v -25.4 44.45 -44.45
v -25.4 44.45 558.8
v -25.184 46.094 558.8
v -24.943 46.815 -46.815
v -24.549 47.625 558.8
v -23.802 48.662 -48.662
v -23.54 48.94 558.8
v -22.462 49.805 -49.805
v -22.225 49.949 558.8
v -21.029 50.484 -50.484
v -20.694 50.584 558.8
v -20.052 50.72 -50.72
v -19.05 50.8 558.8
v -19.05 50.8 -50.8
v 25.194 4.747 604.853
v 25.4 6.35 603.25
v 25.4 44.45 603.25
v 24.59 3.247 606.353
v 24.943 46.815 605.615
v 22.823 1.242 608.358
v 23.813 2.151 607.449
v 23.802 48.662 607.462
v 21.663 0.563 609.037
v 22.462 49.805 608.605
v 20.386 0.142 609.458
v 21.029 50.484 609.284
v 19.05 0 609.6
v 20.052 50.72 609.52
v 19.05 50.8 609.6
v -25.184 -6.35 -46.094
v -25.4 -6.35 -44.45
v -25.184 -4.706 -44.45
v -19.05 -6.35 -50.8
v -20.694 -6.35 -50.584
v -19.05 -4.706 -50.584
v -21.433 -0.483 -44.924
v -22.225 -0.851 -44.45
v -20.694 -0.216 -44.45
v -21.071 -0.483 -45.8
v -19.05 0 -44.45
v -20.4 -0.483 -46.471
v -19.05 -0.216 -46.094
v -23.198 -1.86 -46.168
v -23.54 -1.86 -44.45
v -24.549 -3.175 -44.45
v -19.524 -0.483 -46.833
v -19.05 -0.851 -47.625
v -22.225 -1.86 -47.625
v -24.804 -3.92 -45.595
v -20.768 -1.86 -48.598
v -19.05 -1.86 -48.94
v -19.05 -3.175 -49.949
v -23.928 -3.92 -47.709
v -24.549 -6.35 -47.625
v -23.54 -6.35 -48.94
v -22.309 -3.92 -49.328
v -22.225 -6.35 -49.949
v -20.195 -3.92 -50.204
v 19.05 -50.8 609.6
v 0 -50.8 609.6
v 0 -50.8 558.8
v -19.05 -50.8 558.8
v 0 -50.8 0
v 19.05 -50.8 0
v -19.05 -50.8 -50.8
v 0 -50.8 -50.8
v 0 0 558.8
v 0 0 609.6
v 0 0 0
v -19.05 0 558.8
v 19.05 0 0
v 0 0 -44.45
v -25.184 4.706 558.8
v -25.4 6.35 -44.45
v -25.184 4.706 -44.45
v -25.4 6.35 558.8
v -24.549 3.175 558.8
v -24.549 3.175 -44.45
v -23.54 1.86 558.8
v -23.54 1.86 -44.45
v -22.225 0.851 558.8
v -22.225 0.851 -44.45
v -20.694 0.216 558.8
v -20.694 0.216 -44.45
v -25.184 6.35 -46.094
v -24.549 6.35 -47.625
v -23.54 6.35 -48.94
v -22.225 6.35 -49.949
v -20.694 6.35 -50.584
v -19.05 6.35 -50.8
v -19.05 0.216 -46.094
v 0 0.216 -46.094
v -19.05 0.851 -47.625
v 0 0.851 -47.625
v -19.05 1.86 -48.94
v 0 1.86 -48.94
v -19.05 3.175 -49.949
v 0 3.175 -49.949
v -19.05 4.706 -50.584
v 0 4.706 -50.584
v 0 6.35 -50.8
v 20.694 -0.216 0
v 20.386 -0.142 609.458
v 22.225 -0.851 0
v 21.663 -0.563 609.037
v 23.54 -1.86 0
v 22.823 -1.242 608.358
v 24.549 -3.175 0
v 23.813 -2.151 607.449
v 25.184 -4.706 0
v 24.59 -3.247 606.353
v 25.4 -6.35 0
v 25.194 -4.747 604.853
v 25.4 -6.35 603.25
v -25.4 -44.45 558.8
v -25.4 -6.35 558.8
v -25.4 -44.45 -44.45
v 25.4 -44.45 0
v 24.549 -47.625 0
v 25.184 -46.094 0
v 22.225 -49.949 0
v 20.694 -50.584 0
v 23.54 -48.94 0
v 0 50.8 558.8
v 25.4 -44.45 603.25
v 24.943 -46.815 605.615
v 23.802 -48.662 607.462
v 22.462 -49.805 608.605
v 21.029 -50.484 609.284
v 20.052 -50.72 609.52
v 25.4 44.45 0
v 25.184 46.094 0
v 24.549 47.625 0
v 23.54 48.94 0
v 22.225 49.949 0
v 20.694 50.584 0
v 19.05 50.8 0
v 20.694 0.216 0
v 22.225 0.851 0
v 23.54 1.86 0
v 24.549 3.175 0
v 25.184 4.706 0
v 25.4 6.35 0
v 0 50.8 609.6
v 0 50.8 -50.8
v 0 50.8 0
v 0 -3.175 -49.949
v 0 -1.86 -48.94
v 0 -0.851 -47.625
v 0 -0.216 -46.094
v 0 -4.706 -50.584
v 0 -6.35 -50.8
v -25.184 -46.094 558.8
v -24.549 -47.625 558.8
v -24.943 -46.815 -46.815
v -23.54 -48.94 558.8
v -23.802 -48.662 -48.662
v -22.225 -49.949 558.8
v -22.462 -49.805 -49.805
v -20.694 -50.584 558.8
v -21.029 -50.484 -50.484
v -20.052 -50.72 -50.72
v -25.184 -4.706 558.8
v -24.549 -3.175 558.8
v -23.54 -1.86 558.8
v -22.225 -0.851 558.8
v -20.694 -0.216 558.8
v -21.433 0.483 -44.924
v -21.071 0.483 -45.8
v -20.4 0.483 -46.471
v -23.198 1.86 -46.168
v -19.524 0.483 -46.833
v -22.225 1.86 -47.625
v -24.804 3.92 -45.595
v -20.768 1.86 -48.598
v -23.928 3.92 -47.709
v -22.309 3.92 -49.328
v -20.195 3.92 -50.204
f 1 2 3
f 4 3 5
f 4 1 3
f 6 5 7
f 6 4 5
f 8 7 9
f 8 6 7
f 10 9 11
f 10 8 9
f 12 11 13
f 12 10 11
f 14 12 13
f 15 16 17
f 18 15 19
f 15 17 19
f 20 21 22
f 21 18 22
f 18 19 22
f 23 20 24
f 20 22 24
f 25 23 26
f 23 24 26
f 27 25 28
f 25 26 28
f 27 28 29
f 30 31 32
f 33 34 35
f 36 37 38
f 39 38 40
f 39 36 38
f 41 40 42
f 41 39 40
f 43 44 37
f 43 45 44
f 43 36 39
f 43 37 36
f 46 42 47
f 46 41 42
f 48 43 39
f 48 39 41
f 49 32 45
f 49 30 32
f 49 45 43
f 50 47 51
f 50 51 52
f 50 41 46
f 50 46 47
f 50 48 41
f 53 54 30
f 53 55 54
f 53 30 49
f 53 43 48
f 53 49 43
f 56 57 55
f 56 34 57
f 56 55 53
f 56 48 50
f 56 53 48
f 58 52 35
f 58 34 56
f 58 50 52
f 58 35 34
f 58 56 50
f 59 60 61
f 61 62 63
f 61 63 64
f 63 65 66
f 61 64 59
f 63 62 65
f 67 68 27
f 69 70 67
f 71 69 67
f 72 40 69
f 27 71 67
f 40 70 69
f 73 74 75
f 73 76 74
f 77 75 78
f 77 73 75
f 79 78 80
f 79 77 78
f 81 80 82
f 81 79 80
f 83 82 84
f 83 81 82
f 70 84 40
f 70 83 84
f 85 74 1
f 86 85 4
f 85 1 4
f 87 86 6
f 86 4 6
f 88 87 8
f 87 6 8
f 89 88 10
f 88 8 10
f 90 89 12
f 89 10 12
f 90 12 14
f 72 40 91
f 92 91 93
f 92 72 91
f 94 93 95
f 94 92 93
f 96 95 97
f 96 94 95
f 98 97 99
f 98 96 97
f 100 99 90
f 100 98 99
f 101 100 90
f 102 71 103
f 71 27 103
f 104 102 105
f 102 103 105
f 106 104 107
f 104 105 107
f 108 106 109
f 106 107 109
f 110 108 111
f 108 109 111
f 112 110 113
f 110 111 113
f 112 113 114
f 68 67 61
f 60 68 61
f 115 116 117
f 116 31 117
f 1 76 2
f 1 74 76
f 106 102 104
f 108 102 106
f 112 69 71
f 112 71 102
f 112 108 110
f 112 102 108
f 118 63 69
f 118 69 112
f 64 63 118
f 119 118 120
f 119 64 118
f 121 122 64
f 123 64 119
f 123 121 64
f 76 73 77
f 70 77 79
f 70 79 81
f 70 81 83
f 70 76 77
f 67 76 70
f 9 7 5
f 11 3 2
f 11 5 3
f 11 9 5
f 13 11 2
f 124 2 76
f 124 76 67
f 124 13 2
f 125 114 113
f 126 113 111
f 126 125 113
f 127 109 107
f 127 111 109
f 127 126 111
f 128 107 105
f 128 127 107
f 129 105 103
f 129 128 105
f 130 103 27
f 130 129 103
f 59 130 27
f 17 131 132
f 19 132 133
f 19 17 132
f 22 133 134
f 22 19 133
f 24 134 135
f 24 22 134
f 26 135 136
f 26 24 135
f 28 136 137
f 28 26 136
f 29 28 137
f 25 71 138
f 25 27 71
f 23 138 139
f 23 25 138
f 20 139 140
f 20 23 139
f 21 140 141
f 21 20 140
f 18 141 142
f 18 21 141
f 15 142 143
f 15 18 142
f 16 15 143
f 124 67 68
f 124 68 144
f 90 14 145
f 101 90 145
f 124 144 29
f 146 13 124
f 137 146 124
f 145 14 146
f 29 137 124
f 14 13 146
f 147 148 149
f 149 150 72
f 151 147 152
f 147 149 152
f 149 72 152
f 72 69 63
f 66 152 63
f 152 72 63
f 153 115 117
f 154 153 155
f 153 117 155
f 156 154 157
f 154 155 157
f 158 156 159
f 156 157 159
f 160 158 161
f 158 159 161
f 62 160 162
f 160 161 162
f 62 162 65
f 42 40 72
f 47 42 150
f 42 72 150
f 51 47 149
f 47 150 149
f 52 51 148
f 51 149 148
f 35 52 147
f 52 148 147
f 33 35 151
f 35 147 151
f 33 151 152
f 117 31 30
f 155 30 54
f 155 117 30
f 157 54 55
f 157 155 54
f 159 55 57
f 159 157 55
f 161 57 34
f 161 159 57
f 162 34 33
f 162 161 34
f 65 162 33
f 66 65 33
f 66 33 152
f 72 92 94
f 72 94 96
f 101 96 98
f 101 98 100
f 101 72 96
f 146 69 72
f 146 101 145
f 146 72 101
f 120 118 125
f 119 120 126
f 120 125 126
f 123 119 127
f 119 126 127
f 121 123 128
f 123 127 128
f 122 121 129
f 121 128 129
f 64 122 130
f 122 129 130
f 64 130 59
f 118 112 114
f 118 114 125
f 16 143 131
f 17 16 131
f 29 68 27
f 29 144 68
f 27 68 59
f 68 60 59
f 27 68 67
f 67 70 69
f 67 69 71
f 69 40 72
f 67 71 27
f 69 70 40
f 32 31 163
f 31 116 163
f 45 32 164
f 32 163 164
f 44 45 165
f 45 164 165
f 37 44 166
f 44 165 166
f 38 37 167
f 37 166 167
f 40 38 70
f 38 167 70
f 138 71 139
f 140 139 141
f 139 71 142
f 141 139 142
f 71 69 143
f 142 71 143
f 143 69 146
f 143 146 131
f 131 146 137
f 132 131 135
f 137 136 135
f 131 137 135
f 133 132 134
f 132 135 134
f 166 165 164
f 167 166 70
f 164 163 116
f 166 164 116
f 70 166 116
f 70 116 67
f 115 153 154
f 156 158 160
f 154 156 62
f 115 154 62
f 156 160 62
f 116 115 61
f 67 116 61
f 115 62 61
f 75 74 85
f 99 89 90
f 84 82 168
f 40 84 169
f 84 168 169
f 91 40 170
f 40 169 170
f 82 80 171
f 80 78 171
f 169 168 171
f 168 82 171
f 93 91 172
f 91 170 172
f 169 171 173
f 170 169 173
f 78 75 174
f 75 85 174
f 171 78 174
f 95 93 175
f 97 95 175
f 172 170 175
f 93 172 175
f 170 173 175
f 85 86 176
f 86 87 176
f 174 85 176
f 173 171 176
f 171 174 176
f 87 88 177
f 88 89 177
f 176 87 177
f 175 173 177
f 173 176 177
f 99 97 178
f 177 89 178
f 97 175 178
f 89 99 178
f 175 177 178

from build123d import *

# Parameters (mm, degrees)
F0_W          = 25.4
F0_H          = 50.8
F1_DEPTH      = 609.6
F2_DEPTH      = 50.8
F2_DEPTH_BACK = 558.8
F3_R          = 6.35


with BuildPart() as f1:
    # F0 (on Top) → F1 (new body)
    with BuildSketch(Plane.XY):
        with Locations((12.7, 25.4)):
            Rectangle(F0_W, F0_H)
    extrude(amount=F1_DEPTH)

    # F0 (on Top) → F2 (join, two sides)
    with BuildSketch(Plane.XY) as f2_sk:
        with Locations((-12.7, 25.4)):
            Rectangle(F0_W, F0_H)
    extrude(amount=-F2_DEPTH)
    extrude(f2_sk.sketch, amount=F2_DEPTH_BACK)

    # F3
    f3_edges = [f1.edges().sort_by_distance(p)[0] for p in [
        (25.4, 0, 304.8),
        (25.4, 50.8, 304.8),
        (-25.4, 25.4, -50.8),
        (-25.4, 0, 254),
        (-25.4, 50.8, 254),
        (-12.7, 0, -50.8),
        (25.4, 25.4, 609.6),
    ]]
    fillet(f3_edges, radius=F3_R)


with BuildPart() as f4_1:
    # F4: instance of F1
    add(f1.part.mirror(Plane.XZ))


solid = Compound([f1.part, f4_1.part])
